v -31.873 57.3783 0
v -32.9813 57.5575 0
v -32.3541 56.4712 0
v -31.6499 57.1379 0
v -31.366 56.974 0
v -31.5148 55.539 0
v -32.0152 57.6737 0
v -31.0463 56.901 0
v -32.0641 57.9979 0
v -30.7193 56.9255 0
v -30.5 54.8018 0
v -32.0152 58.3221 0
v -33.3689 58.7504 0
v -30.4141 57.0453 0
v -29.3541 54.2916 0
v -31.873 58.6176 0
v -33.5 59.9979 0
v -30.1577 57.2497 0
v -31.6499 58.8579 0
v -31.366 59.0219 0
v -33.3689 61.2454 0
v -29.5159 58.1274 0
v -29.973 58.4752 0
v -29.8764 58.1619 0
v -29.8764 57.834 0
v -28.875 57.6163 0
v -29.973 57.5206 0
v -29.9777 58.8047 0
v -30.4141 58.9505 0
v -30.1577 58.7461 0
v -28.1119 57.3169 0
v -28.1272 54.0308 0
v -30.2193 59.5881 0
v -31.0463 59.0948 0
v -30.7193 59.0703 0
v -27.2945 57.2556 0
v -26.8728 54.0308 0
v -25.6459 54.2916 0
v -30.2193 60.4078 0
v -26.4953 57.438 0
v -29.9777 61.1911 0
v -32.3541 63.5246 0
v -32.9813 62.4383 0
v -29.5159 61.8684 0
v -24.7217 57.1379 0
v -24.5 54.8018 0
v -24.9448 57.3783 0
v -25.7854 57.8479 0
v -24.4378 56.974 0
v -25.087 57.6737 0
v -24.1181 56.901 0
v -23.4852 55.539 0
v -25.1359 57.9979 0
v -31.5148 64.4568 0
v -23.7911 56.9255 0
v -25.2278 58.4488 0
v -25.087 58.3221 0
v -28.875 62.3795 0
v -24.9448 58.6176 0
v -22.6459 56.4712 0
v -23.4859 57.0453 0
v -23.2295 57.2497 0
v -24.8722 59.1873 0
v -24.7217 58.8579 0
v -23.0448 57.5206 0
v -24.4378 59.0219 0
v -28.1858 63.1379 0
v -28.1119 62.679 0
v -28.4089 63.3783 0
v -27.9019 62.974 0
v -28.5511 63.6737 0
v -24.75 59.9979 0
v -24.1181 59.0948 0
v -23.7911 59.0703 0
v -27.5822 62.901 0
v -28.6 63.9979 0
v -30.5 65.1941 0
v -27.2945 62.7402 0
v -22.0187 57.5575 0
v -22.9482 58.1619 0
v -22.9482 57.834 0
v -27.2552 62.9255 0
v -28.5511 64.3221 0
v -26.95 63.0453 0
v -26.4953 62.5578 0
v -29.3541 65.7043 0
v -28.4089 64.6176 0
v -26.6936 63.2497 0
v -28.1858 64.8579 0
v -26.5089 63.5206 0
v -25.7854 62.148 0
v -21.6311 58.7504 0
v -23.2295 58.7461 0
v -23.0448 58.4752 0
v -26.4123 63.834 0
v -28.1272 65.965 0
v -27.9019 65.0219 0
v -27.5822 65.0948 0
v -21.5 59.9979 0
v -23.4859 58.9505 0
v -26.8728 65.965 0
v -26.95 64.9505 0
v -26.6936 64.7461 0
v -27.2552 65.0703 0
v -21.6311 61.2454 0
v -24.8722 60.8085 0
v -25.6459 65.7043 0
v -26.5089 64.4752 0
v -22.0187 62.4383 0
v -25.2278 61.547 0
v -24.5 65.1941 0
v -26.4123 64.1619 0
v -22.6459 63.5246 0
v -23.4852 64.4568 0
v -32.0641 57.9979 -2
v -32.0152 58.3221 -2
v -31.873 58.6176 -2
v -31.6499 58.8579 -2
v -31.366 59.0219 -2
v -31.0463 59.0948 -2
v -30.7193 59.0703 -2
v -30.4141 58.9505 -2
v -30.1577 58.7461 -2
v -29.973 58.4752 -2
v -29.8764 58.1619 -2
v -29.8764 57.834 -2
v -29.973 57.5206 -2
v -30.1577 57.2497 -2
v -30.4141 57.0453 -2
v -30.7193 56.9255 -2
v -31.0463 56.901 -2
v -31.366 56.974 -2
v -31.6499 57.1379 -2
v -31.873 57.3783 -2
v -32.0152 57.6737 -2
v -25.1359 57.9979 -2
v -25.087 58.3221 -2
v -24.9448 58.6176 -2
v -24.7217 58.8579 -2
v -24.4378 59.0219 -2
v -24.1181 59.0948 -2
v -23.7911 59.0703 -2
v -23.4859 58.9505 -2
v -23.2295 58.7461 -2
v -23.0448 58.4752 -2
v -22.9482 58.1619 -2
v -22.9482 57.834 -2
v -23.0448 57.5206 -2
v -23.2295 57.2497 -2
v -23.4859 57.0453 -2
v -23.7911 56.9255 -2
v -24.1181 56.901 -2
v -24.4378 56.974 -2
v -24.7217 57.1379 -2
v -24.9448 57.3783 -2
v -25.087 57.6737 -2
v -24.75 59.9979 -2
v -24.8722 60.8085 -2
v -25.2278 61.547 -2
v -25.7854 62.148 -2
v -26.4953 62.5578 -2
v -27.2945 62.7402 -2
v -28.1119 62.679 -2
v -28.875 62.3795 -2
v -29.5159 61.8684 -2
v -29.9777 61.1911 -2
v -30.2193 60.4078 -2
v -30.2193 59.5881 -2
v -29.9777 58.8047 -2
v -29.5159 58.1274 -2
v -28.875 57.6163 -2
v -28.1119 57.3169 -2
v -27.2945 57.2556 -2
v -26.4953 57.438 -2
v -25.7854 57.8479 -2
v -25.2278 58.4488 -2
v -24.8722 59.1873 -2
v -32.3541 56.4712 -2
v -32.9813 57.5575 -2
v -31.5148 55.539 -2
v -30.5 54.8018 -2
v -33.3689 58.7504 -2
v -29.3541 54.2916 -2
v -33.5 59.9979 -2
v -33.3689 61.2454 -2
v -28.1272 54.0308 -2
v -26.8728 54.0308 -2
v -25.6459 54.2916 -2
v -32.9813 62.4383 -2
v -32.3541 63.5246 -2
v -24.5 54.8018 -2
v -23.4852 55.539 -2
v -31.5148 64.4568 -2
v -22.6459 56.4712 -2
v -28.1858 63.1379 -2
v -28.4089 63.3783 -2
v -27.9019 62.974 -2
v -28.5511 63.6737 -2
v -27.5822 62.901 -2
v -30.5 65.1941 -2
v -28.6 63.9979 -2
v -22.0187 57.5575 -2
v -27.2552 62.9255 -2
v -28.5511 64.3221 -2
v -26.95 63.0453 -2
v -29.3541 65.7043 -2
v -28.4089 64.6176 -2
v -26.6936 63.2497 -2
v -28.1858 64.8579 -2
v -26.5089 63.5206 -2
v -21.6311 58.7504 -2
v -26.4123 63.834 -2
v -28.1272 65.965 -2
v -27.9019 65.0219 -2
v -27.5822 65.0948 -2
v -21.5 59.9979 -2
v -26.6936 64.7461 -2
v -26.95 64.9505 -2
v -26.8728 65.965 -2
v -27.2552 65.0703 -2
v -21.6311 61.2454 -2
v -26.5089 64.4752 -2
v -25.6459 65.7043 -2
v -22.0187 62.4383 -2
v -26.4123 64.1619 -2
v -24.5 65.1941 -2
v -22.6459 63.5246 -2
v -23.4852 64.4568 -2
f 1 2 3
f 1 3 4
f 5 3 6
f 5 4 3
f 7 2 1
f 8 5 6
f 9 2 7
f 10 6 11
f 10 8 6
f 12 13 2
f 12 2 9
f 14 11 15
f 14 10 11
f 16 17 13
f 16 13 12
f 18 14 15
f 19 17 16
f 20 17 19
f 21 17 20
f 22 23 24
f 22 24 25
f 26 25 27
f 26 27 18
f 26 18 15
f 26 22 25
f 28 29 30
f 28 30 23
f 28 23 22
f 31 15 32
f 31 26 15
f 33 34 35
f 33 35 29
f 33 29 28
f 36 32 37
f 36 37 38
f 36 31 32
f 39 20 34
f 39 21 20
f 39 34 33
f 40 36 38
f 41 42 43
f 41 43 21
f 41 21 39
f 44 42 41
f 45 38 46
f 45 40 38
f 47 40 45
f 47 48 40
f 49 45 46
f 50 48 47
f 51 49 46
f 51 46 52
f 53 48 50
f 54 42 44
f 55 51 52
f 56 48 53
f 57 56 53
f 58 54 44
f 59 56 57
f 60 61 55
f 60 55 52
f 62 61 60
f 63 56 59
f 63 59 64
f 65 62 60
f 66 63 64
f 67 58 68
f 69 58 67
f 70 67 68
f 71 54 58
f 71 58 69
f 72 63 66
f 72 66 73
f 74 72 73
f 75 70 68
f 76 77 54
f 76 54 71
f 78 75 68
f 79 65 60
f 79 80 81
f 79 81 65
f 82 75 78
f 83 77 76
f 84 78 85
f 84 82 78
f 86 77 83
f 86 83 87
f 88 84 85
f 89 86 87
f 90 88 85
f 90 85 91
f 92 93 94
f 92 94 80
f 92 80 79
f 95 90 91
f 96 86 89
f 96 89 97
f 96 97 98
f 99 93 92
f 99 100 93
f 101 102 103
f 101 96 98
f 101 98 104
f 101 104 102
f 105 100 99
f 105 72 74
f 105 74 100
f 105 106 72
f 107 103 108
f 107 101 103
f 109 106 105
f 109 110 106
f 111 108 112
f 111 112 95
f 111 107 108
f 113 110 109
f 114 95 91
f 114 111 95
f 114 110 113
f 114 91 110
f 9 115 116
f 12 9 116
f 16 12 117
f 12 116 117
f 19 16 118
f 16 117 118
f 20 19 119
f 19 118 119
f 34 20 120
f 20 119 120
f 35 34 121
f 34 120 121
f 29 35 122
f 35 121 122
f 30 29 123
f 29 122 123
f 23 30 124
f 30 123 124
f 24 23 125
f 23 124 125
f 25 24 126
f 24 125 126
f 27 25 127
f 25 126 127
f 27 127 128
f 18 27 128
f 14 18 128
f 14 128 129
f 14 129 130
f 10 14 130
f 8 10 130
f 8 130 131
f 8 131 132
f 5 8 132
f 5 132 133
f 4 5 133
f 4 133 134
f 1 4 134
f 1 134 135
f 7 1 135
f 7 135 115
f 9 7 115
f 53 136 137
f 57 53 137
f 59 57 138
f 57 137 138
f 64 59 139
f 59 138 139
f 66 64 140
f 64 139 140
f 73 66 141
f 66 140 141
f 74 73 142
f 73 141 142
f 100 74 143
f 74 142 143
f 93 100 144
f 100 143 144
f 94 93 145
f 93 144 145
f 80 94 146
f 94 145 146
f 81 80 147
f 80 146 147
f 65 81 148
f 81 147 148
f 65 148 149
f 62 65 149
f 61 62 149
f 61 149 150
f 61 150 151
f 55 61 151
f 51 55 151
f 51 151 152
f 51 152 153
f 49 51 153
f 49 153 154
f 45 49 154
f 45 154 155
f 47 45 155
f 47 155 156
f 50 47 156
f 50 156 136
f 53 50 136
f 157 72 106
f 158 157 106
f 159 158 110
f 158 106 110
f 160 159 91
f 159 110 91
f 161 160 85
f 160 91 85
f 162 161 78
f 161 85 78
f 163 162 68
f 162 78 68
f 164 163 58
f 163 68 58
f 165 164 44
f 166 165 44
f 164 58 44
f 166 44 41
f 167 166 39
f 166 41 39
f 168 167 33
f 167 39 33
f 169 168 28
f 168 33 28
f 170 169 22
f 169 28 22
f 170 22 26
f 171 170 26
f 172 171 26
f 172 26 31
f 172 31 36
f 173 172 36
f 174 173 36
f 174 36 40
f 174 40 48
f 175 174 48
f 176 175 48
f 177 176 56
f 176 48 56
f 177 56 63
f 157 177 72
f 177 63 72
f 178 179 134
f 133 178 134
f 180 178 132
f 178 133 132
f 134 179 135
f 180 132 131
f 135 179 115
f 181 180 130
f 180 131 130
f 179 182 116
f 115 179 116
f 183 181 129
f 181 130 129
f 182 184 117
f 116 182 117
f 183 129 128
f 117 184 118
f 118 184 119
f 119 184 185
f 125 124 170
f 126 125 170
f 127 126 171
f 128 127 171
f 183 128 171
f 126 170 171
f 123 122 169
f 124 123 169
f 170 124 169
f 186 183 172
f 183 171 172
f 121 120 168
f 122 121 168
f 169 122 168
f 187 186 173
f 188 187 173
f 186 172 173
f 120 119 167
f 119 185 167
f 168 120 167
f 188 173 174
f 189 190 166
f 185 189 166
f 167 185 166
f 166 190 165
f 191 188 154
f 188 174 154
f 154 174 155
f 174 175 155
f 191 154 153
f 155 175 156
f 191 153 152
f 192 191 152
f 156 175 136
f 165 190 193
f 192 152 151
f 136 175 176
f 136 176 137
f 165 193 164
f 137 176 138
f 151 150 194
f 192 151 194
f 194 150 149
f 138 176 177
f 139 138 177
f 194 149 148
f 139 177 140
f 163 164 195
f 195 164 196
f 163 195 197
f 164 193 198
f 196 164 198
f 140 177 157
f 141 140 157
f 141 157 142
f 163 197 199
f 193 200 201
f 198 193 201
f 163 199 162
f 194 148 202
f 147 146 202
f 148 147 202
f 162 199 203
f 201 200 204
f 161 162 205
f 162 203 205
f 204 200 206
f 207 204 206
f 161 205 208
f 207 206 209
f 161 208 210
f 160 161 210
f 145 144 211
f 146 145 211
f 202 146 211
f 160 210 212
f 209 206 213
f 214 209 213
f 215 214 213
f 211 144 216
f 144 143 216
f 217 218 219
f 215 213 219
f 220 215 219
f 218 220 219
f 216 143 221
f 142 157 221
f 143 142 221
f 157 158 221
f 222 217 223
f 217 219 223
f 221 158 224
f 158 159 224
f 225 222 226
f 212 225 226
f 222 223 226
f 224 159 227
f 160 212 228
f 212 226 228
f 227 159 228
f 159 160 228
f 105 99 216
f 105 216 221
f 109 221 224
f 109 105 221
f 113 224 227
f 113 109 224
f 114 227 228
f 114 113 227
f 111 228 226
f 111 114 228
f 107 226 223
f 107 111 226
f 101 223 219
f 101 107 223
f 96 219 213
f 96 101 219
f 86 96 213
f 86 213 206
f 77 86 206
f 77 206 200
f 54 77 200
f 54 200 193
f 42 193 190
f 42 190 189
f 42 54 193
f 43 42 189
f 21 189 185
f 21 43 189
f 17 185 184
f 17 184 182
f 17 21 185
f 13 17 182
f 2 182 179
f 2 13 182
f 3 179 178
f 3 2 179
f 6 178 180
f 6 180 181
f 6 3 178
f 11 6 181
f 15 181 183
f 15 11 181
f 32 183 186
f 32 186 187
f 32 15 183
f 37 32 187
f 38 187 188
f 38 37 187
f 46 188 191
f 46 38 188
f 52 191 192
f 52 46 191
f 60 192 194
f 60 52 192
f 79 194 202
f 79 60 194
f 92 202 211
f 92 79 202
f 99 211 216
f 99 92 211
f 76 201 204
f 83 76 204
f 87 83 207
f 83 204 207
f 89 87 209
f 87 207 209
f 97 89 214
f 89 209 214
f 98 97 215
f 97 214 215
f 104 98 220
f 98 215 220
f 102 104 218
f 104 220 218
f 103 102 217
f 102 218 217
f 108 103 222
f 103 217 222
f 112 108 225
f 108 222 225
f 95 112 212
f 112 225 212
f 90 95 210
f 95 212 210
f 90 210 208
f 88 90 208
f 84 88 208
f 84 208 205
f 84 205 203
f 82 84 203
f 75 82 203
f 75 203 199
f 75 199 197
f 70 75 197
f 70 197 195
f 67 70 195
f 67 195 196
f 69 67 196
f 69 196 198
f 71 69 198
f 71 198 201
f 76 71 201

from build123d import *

# Parameters (mm, degrees)
SKETCH1_R            = 6
SKETCH1_R_2          = 2.75
BOSS_EXTRUDE1_DEPTH  = 2
M2_CLEARANCE_HOLE1_D = 2.2


with BuildPart() as part:
    # Sketch1 → Boss-Extrude1 (new body)
    with BuildSketch(Plane.XY):
        with Locations((-27.5, 59.99791663)):
            Circle(SKETCH1_R)
        with Locations((-27.5, 59.99791663)):
            Circle(SKETCH1_R_2, mode=Mode.SUBTRACT)
    extrude(amount=-BOSS_EXTRUDE1_DEPTH)

    # M2 Clearance Hole1 (through all)
    with Locations(Plane.XY):
        with Locations((-27.5, 63.99791663), (-24.035898385, 57.99791663), (-30.964101615, 57.99791663)):
            Hole(M2_CLEARANCE_HOLE1_D / 2)


solid = part.part
